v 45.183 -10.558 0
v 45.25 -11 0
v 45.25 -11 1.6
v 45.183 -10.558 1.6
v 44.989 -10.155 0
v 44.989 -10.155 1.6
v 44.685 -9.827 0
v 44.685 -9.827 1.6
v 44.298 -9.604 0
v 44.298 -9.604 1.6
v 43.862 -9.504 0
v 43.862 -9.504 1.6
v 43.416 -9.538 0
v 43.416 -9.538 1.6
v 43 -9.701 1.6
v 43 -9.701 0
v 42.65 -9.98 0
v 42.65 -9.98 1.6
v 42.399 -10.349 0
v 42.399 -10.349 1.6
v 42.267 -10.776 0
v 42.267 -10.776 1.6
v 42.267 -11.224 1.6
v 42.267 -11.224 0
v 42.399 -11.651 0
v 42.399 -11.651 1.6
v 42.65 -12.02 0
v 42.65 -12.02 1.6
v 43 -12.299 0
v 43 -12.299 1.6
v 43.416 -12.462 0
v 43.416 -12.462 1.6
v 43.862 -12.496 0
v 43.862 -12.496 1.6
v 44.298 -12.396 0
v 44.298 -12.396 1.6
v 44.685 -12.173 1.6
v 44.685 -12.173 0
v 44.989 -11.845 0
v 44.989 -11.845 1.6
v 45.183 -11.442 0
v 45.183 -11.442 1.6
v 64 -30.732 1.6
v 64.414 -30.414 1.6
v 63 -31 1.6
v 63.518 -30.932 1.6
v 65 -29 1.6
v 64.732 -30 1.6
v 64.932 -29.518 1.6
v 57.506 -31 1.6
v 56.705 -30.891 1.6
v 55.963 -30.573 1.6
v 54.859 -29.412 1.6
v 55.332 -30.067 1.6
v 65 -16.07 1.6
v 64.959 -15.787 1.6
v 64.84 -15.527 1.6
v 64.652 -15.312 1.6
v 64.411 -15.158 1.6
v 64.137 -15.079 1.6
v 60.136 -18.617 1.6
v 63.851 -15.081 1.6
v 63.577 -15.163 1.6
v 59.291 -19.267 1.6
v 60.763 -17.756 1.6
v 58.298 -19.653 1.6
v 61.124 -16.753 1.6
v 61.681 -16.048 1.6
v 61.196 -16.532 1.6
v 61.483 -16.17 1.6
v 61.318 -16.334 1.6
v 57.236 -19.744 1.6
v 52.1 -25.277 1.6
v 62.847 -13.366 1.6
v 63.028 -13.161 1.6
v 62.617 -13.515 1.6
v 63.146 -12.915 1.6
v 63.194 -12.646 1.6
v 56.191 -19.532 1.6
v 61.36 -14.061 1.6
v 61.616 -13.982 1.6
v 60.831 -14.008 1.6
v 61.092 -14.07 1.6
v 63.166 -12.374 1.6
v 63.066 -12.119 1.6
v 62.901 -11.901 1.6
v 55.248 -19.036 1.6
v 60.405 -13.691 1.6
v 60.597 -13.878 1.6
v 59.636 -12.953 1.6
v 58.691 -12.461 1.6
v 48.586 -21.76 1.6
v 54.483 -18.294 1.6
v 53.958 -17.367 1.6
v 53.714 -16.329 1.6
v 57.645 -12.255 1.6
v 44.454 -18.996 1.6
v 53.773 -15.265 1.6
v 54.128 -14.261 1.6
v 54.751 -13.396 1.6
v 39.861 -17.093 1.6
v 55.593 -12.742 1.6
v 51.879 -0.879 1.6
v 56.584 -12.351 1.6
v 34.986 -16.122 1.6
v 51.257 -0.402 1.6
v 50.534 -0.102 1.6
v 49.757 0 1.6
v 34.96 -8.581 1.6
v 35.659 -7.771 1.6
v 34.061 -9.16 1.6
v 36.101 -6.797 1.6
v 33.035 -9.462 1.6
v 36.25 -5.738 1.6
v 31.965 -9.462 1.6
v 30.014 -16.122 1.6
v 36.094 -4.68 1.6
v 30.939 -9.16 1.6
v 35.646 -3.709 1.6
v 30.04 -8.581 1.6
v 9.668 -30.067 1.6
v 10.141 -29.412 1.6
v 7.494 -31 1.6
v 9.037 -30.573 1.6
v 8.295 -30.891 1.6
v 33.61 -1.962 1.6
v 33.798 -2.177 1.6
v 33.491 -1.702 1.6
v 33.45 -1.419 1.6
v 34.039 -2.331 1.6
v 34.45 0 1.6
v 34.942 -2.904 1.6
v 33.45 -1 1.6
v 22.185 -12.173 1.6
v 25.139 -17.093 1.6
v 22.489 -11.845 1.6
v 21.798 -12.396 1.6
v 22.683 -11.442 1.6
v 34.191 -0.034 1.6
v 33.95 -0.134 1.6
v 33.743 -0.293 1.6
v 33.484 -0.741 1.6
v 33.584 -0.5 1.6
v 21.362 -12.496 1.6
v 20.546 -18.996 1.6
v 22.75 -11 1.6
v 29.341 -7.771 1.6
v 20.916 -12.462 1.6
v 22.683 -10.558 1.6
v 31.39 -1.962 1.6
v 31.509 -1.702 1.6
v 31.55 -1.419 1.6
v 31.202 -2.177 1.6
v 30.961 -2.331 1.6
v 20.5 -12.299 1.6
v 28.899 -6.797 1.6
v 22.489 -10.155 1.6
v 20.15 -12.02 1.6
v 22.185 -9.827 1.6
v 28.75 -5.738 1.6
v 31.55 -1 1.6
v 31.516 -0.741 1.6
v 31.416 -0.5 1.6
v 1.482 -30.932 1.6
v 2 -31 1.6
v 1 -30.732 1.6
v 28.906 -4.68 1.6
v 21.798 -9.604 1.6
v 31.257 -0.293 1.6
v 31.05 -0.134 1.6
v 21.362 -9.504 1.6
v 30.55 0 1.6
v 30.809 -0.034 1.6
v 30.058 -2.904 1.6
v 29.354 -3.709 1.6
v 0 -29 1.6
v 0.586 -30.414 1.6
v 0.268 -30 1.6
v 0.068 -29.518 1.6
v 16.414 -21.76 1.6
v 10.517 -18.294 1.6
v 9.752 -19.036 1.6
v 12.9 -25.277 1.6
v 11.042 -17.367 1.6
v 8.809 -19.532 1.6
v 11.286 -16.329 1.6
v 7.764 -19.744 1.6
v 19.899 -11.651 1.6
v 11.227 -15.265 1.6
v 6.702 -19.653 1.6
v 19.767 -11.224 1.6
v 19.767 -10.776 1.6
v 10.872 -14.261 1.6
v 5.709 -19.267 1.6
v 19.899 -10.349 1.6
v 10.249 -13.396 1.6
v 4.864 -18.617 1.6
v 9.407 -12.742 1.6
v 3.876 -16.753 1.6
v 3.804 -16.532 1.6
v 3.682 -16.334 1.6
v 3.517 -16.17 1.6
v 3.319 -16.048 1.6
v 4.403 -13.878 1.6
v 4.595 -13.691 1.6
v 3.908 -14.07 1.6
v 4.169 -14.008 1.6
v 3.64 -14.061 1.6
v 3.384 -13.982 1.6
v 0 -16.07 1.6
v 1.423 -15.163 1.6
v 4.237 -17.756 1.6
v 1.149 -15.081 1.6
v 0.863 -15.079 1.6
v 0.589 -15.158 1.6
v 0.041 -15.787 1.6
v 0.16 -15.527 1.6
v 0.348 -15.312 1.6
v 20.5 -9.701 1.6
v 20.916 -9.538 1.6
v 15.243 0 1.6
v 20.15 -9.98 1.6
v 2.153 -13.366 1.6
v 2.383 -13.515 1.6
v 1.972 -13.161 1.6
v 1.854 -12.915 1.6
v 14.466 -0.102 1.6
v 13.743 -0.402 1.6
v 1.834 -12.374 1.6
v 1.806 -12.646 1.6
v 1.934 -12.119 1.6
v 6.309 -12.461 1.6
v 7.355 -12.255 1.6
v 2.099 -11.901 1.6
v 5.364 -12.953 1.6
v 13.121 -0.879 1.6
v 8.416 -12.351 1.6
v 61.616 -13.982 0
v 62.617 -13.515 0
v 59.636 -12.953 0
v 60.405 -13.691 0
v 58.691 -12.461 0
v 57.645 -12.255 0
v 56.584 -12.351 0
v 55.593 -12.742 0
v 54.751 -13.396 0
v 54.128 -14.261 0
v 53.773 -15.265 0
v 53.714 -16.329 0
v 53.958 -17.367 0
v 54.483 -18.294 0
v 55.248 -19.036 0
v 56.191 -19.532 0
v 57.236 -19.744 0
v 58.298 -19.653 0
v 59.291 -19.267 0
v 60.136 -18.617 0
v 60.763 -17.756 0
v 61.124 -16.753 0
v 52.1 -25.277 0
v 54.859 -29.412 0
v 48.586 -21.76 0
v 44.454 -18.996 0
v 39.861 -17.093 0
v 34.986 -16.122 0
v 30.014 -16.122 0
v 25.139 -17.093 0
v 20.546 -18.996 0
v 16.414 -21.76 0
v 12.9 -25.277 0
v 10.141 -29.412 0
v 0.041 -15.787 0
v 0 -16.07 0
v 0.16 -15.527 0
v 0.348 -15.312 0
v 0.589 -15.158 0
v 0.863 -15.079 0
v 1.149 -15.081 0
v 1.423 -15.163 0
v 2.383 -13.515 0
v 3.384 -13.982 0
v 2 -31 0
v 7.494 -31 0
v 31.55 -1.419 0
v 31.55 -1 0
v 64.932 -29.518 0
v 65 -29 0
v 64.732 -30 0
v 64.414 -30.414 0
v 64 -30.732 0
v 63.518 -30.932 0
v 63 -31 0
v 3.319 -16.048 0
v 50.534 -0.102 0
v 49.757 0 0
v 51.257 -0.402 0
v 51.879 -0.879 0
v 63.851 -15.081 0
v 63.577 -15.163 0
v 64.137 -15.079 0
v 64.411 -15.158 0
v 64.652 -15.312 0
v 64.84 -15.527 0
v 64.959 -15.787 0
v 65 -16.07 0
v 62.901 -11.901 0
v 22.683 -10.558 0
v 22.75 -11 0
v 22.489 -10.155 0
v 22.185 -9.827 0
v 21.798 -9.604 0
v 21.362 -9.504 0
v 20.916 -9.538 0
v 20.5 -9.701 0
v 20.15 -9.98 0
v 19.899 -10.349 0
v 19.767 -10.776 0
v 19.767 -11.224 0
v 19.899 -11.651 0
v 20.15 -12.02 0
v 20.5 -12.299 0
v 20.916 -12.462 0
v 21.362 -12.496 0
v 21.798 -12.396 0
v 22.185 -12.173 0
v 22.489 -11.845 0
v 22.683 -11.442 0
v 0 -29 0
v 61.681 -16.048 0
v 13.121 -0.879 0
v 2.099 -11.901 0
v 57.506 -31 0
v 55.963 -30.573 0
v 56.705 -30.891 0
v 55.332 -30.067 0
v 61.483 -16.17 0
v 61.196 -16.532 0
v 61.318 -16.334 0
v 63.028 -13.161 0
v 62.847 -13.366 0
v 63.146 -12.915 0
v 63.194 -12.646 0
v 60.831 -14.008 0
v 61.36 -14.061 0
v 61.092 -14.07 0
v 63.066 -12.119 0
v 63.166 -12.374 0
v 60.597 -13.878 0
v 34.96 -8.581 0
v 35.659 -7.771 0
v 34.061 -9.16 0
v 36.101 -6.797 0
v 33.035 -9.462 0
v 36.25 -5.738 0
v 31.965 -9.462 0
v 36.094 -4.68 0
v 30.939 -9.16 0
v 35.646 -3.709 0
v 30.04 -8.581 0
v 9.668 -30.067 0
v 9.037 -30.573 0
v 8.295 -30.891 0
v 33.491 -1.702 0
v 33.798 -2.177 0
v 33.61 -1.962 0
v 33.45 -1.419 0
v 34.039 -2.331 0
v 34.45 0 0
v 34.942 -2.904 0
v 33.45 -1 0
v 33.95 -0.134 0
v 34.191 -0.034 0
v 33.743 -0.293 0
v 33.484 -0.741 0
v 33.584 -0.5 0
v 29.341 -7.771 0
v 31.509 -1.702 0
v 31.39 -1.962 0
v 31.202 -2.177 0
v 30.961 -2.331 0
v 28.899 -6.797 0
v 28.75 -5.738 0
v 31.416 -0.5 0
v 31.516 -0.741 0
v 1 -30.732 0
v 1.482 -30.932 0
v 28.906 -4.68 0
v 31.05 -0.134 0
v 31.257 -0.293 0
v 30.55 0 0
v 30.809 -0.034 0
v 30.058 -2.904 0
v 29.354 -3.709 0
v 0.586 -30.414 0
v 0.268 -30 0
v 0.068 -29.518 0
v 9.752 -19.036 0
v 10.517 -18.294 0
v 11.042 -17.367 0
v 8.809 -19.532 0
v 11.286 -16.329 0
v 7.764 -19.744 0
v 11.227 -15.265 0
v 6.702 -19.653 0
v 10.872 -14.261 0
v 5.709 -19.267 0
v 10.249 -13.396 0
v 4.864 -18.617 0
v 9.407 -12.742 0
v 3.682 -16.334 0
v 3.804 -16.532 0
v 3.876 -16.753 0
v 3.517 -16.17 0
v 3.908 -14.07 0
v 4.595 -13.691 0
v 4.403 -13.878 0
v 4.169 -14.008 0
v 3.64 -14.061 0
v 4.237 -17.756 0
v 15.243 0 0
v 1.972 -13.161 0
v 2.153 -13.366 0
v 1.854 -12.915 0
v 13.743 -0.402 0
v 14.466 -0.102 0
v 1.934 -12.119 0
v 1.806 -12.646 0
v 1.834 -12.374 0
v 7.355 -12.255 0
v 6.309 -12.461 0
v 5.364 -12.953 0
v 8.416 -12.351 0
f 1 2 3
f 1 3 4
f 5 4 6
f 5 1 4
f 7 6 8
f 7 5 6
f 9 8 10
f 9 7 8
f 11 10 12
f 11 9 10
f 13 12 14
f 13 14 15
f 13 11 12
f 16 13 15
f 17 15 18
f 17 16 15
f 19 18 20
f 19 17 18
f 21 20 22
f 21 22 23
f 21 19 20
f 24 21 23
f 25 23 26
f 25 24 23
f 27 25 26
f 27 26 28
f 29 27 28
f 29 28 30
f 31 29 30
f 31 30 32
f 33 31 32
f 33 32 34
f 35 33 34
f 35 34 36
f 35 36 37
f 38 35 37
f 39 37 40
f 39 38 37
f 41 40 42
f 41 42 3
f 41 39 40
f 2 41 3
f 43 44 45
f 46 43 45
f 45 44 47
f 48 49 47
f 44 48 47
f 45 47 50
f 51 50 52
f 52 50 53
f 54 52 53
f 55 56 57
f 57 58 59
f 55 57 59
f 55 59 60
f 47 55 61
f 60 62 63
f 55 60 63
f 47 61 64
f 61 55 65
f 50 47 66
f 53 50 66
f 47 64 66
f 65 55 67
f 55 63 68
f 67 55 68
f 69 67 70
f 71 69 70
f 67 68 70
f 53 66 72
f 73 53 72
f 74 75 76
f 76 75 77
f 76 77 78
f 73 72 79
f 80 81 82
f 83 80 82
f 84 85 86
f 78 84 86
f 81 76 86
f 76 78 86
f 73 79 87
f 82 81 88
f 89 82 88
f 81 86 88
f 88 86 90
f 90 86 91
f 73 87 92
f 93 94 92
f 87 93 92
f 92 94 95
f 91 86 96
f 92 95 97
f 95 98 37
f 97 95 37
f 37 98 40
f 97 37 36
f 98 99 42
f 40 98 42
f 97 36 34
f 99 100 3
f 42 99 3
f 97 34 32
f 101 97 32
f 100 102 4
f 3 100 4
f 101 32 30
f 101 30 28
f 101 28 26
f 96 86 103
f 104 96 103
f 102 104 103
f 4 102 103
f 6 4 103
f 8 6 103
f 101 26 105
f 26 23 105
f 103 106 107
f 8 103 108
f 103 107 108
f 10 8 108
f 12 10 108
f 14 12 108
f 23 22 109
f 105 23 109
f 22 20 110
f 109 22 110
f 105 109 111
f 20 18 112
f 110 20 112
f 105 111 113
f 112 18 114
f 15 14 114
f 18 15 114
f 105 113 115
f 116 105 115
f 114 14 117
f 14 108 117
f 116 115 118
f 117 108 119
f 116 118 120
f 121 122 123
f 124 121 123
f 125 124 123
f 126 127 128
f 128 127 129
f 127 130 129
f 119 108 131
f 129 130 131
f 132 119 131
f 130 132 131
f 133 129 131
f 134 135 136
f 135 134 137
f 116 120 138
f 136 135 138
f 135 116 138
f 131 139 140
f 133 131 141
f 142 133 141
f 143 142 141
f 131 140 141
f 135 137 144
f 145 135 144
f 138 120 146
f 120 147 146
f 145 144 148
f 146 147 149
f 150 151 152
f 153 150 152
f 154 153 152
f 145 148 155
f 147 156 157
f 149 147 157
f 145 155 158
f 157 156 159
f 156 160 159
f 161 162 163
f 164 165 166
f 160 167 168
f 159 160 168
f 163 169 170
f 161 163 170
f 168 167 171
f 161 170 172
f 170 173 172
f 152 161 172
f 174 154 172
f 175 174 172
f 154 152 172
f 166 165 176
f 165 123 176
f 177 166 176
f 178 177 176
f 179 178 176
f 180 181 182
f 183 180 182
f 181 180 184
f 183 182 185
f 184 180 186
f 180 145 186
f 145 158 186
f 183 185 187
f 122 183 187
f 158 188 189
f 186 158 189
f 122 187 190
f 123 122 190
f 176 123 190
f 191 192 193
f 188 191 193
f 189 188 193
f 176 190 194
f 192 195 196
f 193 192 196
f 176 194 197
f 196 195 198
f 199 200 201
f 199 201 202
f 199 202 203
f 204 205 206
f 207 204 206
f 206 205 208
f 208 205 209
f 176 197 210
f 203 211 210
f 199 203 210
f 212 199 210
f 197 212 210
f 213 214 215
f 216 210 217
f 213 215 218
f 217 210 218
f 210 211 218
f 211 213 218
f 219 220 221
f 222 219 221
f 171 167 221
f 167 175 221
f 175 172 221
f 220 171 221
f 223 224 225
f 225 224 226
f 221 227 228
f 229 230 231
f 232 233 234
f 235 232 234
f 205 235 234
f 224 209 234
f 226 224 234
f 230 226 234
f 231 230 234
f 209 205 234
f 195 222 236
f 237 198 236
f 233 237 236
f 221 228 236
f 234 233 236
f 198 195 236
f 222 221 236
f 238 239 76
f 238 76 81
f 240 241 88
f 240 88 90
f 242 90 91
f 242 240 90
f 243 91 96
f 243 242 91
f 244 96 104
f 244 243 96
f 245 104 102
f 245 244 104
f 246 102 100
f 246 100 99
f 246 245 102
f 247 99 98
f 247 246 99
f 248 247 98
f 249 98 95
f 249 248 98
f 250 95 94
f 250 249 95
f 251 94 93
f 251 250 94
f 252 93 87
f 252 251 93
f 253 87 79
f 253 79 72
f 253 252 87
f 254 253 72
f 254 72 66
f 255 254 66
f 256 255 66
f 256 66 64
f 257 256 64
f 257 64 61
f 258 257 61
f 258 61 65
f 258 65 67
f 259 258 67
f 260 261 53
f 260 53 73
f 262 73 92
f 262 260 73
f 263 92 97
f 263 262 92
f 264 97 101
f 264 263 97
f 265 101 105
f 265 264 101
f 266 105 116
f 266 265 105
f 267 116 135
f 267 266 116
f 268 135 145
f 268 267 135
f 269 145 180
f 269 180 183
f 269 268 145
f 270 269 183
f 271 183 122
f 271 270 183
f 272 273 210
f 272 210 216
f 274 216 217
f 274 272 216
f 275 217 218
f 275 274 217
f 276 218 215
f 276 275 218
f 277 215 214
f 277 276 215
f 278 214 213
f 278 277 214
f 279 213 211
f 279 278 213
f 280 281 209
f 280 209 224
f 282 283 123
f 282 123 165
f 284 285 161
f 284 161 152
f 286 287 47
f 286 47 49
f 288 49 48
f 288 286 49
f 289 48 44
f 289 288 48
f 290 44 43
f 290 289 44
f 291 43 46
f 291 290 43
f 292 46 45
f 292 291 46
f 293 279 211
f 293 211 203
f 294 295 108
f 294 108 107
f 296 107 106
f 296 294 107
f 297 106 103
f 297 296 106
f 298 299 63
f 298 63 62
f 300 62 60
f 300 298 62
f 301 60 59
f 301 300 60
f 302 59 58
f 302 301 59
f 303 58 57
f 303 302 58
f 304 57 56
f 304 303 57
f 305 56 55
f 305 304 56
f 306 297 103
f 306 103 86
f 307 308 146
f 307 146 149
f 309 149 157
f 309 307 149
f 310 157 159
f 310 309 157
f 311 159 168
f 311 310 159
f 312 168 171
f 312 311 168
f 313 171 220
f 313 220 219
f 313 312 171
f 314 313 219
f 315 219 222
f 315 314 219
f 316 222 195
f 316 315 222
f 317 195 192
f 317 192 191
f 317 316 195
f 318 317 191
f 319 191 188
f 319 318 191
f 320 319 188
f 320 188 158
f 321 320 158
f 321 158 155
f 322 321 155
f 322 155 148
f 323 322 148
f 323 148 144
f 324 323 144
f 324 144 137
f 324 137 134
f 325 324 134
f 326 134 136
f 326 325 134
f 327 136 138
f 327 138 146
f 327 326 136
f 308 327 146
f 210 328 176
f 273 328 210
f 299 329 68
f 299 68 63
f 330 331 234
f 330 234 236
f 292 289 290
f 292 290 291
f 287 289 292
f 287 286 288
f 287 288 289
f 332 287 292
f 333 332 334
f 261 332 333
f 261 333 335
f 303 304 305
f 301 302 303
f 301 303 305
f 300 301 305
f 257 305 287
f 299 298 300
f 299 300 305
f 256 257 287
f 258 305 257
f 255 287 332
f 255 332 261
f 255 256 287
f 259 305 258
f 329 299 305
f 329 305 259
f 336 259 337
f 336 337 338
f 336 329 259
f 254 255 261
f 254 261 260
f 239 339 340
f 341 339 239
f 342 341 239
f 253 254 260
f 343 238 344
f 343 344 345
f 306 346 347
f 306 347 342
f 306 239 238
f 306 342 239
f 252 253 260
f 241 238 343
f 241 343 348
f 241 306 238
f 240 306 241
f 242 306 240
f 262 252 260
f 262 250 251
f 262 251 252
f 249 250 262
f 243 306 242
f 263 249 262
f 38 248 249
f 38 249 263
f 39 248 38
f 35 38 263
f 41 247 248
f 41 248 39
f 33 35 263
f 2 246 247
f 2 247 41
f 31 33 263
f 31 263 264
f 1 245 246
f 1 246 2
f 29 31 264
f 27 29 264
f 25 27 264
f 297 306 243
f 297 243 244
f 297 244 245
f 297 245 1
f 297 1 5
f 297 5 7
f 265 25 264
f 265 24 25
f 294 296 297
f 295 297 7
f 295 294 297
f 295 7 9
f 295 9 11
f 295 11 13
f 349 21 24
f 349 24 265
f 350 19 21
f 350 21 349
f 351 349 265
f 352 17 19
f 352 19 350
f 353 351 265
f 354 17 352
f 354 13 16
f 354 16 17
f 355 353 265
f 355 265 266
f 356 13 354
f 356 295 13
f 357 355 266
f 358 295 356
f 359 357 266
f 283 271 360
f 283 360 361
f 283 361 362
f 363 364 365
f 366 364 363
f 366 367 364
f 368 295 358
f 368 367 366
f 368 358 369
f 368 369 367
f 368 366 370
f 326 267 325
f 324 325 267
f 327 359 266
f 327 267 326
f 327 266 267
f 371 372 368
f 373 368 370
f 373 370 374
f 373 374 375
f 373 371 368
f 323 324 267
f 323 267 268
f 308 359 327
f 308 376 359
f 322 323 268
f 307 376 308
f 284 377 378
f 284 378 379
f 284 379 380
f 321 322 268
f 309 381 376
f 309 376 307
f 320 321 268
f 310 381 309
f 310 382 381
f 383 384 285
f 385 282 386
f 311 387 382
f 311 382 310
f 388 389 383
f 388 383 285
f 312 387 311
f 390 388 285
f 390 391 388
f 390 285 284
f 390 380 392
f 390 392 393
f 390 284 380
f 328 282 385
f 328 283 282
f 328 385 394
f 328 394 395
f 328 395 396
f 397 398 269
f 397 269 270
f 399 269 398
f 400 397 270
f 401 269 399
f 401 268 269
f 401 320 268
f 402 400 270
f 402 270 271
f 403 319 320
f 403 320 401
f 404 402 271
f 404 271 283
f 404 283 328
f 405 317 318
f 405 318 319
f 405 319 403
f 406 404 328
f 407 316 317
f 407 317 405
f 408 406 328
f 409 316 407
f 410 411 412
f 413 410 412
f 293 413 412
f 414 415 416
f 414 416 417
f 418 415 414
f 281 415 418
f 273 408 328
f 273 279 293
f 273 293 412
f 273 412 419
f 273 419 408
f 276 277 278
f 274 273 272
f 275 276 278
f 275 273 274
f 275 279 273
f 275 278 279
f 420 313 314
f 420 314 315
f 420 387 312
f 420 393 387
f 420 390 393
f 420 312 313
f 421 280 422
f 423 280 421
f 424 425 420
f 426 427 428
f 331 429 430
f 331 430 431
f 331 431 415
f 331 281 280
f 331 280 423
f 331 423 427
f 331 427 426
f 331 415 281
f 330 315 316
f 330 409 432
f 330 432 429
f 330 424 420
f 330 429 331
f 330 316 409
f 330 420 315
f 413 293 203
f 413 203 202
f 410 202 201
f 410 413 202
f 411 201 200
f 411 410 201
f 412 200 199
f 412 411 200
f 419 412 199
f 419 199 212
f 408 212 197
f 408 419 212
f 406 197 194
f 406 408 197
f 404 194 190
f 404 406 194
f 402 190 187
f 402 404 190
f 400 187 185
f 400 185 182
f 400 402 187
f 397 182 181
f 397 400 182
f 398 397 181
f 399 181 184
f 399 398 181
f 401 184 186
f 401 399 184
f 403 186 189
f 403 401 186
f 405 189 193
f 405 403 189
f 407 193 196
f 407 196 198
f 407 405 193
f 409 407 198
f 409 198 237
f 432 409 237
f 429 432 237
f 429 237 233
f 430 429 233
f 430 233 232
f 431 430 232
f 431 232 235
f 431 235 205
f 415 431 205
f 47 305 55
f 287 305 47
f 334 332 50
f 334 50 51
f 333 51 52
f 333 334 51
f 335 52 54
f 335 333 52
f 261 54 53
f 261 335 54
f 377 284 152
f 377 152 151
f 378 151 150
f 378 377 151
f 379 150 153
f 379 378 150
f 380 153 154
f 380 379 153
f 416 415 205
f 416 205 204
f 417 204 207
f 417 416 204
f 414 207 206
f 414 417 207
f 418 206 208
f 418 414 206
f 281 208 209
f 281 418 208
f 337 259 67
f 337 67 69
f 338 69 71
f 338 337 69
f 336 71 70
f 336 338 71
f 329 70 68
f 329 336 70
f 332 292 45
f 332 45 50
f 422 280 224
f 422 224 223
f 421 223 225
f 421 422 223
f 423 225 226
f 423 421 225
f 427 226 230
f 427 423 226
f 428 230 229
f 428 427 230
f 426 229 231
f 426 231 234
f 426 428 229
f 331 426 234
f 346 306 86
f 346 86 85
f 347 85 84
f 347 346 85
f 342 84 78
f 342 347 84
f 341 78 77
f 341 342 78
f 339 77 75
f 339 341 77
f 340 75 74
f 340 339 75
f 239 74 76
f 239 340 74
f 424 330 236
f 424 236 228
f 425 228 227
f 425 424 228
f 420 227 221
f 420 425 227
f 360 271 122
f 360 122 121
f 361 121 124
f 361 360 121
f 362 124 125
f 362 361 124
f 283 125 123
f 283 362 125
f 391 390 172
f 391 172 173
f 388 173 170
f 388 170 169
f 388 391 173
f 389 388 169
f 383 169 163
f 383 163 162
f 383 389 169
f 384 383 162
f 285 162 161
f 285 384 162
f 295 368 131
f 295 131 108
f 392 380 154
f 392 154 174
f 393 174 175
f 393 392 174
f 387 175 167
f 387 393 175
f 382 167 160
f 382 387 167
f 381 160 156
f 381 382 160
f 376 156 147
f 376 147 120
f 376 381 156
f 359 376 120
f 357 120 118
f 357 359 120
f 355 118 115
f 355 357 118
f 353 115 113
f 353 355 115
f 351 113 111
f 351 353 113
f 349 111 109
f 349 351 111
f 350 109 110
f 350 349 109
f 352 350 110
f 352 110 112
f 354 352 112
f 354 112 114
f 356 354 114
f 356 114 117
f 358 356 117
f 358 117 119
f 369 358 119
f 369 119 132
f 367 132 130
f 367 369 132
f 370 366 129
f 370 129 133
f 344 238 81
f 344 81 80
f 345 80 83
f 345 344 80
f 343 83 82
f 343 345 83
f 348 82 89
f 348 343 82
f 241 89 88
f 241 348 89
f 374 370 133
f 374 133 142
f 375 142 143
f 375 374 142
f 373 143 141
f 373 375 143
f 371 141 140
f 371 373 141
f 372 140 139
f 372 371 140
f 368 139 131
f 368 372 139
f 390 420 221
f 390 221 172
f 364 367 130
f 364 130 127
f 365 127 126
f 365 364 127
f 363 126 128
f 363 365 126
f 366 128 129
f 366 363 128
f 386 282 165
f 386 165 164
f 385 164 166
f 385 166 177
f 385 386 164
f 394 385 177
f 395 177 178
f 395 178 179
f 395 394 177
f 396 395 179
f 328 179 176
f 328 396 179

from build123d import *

# Parameters (mm, degrees)
IZIM1_R                     = 1.5
Y_KSEKLIK_EKSTR_ZYON1_DEPTH = 1.6


with BuildPart() as part:
    # Çizim1 → Yükseklik-Ekstrüzyon1 (new body)
    with BuildSketch(Plane.XY):
        with BuildLine():
            Line((51.878679656, -0.878679656), (62.901413512, -11.901413512))
            ThreePointArc((62.901413512, -11.901413512), (63.179114484, -12.782168471), (62.616924992, -13.51482808))
            Line((62.616924992, -13.51482808), (61.615557944, -13.981773203))
            ThreePointArc((61.615557944, -13.981773203), (60.959512838, -14.047839782), (60.404952381, -13.691156907))
            ThreePointArc((60.404952381, -13.691156907), (53.799180994, -16.856750014), (61.123557768, -16.753308252))
            ThreePointArc((61.123557768, -16.753308252), (61.318334892, -16.334489822), (61.680554911, -16.047882666))
            Line((61.680554911, -16.047882666), (63.577381738, -15.16337779))
            ThreePointArc((63.577381738, -15.16337779), (64.537299608, -15.226294131), (65, -16.069685577))
            Line((65, -16.069685577), (65, -29))
            ThreePointArc((65, -29), (64.414213562, -30.414213562), (63, -31))
            Line((63, -31), (57.505773979, -31))
            ThreePointArc((57.505773979, -31), (55.962548796, -30.572636009), (54.859002861, -29.412304022))
            ThreePointArc((54.859002861, -29.412304022), (32.5, -16), (10.140997139, -29.412304022))
            ThreePointArc((10.140997139, -29.412304022), (9.037451204, -30.572636009), (7.494226021, -31))
            Line((7.494226021, -31), (2, -31))
            ThreePointArc((2, -31), (0.585786438, -30.414213562), (0, -29))
            Line((0, -29), (0, -16.069685577))
            ThreePointArc((0, -16.069685577), (0.462700392, -15.226294131), (1.422618262, -15.16337779))
            Line((1.422618262, -15.16337779), (3.319445089, -16.047882666))
            ThreePointArc((3.319445089, -16.047882666), (3.681665108, -16.334489822), (3.876442232, -16.753308252))
            ThreePointArc((3.876442232, -16.753308252), (11.200819006, -16.856750014), (4.595047619, -13.691156907))
            ThreePointArc((4.595047619, -13.691156907), (4.040487162, -14.047839782), (3.384442056, -13.981773203))
            Line((3.384442056, -13.981773203), (2.383075008, -13.51482808))
            ThreePointArc((2.383075008, -13.51482808), (1.820885516, -12.782168471), (2.098586488, -11.901413512))
            Line((2.098586488, -11.901413512), (13.121320344, -0.878679656))
            ThreePointArc((13.121320344, -0.878679656), (14.09459039, -0.228361402), (15.242640687, 0))
            Line((15.242640687, 0), (30.55, 0))
            ThreePointArc((30.55, 0), (31.257106781, -0.292893219), (31.55, -1))
            Line((31.55, -1), (31.55, -1.418718434))
            ThreePointArc((31.55, -1.418718434), (31.389799475, -1.961615148), (30.960526316, -2.330567185))
            ThreePointArc((30.960526316, -2.330567185), (32.5, -9.5), (34.039473684, -2.330567185))
            ThreePointArc((34.039473684, -2.330567185), (33.610200525, -1.961615148), (33.45, -1.418718434))
            Line((33.45, -1.418718434), (33.45, -1))
            ThreePointArc((33.45, -1), (33.742893219, -0.292893219), (34.45, 0))
            Line((34.45, 0), (49.757359313, 0))
            ThreePointArc((49.757359313, 0), (50.90540961, -0.228361402), (51.878679656, -0.878679656))
        make_face()
        with Locations((21.25, -11)):
            Circle(IZIM1_R, mode=Mode.SUBTRACT)
        with Locations((43.75, -11)):
            Circle(IZIM1_R, mode=Mode.SUBTRACT)
    extrude(amount=Y_KSEKLIK_EKSTR_ZYON1_DEPTH)


solid = part.part
